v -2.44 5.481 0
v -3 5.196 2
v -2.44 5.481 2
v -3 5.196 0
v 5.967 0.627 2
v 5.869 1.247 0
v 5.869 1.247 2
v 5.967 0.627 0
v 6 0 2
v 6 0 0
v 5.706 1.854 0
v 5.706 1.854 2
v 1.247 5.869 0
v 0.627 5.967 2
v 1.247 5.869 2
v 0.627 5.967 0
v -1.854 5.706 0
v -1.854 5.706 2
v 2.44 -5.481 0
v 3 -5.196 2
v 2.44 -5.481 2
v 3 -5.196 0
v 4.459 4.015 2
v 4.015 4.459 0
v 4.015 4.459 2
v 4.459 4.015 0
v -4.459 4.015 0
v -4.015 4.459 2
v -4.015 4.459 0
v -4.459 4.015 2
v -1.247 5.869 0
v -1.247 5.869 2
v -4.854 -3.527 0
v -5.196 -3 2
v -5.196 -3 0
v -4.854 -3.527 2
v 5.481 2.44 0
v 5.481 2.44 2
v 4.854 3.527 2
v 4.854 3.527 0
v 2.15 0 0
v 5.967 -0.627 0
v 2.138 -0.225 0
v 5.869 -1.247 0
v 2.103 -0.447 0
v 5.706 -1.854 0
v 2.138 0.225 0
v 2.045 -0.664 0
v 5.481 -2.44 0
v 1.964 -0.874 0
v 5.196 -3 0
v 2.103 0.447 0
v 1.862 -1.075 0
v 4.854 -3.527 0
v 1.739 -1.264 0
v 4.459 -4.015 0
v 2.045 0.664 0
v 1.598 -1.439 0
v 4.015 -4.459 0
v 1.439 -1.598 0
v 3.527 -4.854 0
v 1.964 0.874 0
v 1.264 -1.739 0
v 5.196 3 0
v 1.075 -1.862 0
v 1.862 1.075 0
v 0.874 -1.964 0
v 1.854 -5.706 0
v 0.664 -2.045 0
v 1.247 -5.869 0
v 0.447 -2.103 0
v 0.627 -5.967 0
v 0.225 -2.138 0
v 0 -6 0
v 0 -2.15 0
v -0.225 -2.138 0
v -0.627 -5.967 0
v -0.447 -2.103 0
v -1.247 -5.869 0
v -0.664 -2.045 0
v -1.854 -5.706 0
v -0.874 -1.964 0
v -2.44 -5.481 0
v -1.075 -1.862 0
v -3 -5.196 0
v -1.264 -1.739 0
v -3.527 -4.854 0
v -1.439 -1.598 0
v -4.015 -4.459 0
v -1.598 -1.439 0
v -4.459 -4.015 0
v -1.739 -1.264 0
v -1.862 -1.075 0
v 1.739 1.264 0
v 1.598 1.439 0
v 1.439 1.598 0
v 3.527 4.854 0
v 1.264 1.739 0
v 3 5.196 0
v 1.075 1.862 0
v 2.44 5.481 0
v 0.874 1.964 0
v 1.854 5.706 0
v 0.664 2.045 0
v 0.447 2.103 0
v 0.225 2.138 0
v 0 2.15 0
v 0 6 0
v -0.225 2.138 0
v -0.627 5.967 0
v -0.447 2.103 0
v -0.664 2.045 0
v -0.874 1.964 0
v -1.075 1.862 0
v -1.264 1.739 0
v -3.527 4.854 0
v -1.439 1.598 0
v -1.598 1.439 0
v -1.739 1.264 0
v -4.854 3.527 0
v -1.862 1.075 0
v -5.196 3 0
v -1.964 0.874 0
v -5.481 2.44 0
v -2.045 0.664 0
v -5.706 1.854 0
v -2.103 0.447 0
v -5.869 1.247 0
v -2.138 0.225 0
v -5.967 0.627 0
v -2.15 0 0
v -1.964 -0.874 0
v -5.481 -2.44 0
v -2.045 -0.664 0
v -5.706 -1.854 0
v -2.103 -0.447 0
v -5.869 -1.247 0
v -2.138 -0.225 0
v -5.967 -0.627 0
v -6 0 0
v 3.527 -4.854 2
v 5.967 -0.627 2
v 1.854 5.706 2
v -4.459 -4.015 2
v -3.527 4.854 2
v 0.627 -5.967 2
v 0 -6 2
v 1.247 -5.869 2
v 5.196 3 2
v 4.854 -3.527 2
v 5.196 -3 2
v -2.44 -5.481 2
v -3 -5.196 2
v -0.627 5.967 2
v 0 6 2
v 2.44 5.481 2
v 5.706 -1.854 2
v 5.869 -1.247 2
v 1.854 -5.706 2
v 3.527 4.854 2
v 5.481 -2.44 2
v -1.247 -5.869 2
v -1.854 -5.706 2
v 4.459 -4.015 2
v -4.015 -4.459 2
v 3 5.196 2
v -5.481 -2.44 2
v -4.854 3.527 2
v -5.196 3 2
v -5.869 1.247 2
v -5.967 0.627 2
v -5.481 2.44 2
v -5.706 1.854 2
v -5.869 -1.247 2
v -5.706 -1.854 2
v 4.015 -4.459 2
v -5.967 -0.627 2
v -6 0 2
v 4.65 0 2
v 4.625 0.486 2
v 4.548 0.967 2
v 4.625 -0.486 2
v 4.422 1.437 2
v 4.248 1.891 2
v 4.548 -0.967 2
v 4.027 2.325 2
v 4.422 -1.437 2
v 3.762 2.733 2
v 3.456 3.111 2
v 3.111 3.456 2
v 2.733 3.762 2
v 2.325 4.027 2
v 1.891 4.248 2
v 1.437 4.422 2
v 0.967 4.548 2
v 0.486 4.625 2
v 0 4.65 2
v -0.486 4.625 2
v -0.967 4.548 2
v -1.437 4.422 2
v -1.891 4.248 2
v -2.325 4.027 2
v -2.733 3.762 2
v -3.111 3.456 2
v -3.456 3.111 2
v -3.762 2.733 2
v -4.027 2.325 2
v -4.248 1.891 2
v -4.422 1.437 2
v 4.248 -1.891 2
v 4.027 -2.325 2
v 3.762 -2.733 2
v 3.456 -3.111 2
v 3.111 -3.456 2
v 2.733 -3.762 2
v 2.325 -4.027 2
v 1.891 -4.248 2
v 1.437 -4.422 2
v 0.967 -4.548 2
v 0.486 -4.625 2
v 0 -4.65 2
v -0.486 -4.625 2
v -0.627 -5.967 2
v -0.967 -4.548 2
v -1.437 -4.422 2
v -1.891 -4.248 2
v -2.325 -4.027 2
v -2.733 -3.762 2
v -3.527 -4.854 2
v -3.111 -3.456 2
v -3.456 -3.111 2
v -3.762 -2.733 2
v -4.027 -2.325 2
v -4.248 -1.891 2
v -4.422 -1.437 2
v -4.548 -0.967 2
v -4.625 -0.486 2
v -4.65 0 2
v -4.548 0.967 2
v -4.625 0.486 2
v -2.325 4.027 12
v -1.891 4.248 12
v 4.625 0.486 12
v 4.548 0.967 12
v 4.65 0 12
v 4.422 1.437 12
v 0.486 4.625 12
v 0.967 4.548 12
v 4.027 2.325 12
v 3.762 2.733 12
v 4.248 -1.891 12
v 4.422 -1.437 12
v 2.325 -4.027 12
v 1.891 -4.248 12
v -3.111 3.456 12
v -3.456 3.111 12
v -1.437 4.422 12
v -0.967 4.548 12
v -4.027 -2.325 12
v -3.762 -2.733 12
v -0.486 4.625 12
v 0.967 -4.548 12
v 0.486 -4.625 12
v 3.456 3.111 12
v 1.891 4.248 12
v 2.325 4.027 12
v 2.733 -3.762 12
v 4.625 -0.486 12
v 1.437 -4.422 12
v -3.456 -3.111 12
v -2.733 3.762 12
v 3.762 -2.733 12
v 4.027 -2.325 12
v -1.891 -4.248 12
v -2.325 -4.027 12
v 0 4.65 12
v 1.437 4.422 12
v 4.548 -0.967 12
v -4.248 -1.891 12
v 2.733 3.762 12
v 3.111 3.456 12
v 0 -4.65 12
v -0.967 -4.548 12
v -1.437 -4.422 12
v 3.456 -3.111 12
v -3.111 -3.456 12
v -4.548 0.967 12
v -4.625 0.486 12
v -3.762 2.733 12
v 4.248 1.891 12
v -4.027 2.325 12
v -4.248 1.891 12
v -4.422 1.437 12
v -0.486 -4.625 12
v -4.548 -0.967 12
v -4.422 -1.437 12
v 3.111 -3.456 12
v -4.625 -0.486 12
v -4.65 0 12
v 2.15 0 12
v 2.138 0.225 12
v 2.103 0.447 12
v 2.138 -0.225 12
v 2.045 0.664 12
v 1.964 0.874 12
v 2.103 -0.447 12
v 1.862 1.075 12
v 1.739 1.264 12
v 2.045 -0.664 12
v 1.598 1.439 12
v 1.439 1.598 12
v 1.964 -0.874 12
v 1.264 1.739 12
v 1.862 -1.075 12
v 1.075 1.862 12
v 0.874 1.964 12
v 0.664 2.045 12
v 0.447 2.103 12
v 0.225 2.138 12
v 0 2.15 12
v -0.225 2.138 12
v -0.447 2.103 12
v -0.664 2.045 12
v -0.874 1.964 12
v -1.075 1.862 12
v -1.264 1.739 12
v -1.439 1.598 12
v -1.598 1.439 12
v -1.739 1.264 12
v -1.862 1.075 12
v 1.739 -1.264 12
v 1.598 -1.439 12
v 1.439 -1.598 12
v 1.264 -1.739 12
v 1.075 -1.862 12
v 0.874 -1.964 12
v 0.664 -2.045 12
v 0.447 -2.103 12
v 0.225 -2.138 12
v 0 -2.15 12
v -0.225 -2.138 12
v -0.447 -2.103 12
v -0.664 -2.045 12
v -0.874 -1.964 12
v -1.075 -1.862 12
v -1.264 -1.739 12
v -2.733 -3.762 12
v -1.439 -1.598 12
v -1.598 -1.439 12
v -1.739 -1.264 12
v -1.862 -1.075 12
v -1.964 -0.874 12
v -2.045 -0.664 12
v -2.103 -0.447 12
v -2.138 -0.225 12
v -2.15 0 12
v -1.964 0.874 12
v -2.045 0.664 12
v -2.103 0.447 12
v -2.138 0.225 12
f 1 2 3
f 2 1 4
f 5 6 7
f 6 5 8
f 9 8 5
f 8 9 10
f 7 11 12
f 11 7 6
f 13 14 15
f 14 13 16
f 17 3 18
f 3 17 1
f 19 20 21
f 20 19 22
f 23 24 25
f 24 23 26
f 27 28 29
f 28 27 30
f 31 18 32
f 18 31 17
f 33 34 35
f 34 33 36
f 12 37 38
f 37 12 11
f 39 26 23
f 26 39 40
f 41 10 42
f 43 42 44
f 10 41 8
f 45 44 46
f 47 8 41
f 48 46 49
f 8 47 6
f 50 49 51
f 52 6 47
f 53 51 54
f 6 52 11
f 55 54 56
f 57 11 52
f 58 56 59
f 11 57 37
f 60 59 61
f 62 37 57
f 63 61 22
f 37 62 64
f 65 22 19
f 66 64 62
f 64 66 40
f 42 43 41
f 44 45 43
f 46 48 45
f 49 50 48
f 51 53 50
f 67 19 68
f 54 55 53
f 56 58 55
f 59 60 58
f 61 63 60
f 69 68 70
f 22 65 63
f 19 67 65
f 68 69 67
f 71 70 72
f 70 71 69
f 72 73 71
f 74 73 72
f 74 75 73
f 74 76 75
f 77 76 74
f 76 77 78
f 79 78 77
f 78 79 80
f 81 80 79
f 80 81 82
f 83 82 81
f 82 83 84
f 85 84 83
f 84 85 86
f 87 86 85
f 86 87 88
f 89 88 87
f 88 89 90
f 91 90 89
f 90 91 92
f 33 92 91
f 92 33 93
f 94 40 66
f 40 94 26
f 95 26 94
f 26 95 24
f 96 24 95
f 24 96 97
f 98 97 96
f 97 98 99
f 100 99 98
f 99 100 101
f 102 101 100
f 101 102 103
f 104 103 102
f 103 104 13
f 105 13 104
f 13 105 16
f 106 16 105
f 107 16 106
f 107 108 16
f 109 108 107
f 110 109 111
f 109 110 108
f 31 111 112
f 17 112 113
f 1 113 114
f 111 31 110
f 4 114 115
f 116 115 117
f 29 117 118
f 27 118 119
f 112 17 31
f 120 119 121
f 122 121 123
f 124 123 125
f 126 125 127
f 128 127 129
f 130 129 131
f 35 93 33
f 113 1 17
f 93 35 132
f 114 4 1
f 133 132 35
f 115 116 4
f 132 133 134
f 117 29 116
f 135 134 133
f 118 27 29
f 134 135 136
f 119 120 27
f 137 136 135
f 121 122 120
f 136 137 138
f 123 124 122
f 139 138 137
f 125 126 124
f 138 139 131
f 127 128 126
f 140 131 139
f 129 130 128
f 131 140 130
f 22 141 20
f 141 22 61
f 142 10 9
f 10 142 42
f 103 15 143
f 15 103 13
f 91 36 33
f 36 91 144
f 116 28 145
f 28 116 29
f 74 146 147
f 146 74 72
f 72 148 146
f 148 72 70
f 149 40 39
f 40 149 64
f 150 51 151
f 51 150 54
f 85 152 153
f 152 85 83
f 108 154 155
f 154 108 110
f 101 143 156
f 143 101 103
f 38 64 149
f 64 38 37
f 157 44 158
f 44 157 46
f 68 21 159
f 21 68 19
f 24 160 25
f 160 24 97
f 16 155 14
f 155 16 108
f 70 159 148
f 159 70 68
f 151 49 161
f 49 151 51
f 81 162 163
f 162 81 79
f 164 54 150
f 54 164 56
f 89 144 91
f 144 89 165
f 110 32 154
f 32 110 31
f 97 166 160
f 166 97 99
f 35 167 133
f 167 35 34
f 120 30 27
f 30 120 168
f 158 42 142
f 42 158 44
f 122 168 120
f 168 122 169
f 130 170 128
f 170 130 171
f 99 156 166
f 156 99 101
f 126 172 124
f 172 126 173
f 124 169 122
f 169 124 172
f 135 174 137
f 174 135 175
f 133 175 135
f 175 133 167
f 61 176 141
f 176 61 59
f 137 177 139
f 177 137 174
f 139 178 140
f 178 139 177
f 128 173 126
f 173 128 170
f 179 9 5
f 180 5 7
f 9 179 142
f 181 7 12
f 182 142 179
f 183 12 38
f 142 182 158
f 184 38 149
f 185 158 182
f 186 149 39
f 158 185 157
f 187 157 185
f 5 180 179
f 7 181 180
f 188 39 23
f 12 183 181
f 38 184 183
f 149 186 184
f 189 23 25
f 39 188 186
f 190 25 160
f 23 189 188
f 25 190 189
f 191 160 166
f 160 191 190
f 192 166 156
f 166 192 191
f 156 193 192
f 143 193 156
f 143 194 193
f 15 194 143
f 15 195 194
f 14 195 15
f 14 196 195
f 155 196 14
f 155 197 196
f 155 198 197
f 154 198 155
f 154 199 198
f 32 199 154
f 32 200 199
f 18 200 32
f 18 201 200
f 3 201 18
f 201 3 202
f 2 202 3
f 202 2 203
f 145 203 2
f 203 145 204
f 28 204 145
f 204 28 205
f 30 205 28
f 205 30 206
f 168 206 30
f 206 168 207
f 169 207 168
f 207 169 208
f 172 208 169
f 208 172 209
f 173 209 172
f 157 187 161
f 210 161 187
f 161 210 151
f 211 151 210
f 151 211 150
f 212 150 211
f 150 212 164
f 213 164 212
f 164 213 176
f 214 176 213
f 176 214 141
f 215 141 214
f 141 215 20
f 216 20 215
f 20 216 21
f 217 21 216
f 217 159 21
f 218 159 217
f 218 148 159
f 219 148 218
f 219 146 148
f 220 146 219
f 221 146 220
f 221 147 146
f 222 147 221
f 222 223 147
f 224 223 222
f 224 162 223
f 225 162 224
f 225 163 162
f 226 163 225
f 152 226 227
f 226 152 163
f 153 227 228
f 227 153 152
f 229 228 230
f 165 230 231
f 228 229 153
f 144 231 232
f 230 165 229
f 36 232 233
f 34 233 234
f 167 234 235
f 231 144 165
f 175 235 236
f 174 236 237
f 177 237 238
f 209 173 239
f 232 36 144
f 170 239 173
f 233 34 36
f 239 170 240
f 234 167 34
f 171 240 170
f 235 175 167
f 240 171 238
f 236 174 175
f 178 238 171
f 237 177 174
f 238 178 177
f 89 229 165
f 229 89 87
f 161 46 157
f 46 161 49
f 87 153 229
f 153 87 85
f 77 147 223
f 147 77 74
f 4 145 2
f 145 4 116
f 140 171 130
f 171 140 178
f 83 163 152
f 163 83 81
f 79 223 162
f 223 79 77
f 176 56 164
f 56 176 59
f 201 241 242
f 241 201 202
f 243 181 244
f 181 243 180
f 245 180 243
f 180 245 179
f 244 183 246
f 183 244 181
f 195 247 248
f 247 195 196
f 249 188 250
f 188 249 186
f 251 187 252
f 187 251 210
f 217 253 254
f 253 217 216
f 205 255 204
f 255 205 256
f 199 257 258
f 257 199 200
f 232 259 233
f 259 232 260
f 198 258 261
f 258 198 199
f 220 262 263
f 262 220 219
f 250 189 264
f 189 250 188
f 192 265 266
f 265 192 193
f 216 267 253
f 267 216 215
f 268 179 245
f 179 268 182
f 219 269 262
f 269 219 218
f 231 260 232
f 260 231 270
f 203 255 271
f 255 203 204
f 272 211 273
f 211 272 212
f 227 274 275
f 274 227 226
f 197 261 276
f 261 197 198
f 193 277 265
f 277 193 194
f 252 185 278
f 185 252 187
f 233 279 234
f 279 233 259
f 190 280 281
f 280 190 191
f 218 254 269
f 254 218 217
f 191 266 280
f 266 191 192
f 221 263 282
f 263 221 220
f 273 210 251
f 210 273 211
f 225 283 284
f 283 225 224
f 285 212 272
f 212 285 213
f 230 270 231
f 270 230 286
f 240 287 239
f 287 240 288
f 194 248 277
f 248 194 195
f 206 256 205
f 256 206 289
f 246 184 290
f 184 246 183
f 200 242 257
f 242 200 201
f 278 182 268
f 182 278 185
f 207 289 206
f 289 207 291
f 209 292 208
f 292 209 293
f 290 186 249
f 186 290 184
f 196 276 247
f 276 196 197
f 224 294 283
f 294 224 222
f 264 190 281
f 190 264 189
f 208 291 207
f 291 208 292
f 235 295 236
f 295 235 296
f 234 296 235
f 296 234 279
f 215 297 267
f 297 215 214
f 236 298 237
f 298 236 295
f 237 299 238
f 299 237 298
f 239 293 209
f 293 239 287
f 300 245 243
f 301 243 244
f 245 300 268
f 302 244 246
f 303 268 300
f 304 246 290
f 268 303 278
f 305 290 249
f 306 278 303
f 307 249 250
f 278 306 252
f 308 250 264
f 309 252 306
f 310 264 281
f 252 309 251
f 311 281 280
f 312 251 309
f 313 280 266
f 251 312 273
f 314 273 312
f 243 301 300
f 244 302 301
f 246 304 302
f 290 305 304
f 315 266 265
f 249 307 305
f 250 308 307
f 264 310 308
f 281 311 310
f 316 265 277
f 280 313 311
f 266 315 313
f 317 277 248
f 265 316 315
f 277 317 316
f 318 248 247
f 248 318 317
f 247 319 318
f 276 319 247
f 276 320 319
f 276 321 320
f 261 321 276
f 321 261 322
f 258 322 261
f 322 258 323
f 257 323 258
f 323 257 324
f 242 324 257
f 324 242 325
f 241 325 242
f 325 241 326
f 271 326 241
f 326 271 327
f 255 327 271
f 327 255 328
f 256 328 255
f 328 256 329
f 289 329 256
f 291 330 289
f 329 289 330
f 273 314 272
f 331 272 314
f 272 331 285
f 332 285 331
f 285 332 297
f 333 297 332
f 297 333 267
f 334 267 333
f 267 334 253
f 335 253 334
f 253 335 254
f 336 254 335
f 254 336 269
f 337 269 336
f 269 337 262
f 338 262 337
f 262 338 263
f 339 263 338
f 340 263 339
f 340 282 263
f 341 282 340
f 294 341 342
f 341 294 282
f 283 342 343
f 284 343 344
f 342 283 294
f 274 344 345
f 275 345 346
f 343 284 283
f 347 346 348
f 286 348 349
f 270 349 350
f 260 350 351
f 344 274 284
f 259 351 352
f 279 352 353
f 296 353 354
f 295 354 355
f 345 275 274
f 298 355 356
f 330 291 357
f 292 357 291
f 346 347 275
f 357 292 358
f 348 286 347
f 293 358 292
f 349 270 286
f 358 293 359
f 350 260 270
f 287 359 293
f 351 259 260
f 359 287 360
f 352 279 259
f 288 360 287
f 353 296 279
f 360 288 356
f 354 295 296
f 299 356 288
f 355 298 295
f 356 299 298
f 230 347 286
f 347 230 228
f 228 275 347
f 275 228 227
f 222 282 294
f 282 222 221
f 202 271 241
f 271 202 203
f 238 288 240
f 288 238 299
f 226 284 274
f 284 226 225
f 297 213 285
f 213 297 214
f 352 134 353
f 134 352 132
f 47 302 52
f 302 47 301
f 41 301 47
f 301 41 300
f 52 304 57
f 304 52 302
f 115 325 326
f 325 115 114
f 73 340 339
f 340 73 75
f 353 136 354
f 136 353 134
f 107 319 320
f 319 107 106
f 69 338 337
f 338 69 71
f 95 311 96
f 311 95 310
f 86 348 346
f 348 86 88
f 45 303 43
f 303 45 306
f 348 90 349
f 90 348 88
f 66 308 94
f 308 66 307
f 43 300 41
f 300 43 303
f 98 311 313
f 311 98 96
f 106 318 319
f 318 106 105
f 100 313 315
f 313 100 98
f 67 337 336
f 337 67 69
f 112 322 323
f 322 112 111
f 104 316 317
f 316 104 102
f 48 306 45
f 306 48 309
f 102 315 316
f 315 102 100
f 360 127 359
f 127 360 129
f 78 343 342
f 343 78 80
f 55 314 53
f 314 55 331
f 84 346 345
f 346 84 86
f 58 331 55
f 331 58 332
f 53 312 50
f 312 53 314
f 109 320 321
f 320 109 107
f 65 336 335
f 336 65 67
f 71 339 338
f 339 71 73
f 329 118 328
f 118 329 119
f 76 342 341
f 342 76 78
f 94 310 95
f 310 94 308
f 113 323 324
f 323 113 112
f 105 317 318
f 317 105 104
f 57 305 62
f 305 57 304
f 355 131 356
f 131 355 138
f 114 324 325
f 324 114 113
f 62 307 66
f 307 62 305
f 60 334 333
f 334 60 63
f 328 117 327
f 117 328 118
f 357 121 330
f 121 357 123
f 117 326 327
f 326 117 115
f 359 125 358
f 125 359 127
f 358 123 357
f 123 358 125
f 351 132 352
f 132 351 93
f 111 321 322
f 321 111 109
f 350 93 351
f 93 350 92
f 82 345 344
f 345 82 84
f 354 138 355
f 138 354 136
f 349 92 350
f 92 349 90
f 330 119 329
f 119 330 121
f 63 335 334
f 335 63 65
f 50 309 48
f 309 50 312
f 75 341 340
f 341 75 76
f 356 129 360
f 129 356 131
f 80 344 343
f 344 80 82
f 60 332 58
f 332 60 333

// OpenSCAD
// PCB standoff with mounting base.
$fn = 60;
eps = 0.02;
thread_d = 4.3;
base_d = 12;
height = 12;
body_d = thread_d+5;
difference() {
    union() { cylinder(d=base_d,h=2); cylinder(d=body_d,h=height); }
    translate([0,0,-eps]) cylinder(d=thread_d,h=height+2*eps);
}
